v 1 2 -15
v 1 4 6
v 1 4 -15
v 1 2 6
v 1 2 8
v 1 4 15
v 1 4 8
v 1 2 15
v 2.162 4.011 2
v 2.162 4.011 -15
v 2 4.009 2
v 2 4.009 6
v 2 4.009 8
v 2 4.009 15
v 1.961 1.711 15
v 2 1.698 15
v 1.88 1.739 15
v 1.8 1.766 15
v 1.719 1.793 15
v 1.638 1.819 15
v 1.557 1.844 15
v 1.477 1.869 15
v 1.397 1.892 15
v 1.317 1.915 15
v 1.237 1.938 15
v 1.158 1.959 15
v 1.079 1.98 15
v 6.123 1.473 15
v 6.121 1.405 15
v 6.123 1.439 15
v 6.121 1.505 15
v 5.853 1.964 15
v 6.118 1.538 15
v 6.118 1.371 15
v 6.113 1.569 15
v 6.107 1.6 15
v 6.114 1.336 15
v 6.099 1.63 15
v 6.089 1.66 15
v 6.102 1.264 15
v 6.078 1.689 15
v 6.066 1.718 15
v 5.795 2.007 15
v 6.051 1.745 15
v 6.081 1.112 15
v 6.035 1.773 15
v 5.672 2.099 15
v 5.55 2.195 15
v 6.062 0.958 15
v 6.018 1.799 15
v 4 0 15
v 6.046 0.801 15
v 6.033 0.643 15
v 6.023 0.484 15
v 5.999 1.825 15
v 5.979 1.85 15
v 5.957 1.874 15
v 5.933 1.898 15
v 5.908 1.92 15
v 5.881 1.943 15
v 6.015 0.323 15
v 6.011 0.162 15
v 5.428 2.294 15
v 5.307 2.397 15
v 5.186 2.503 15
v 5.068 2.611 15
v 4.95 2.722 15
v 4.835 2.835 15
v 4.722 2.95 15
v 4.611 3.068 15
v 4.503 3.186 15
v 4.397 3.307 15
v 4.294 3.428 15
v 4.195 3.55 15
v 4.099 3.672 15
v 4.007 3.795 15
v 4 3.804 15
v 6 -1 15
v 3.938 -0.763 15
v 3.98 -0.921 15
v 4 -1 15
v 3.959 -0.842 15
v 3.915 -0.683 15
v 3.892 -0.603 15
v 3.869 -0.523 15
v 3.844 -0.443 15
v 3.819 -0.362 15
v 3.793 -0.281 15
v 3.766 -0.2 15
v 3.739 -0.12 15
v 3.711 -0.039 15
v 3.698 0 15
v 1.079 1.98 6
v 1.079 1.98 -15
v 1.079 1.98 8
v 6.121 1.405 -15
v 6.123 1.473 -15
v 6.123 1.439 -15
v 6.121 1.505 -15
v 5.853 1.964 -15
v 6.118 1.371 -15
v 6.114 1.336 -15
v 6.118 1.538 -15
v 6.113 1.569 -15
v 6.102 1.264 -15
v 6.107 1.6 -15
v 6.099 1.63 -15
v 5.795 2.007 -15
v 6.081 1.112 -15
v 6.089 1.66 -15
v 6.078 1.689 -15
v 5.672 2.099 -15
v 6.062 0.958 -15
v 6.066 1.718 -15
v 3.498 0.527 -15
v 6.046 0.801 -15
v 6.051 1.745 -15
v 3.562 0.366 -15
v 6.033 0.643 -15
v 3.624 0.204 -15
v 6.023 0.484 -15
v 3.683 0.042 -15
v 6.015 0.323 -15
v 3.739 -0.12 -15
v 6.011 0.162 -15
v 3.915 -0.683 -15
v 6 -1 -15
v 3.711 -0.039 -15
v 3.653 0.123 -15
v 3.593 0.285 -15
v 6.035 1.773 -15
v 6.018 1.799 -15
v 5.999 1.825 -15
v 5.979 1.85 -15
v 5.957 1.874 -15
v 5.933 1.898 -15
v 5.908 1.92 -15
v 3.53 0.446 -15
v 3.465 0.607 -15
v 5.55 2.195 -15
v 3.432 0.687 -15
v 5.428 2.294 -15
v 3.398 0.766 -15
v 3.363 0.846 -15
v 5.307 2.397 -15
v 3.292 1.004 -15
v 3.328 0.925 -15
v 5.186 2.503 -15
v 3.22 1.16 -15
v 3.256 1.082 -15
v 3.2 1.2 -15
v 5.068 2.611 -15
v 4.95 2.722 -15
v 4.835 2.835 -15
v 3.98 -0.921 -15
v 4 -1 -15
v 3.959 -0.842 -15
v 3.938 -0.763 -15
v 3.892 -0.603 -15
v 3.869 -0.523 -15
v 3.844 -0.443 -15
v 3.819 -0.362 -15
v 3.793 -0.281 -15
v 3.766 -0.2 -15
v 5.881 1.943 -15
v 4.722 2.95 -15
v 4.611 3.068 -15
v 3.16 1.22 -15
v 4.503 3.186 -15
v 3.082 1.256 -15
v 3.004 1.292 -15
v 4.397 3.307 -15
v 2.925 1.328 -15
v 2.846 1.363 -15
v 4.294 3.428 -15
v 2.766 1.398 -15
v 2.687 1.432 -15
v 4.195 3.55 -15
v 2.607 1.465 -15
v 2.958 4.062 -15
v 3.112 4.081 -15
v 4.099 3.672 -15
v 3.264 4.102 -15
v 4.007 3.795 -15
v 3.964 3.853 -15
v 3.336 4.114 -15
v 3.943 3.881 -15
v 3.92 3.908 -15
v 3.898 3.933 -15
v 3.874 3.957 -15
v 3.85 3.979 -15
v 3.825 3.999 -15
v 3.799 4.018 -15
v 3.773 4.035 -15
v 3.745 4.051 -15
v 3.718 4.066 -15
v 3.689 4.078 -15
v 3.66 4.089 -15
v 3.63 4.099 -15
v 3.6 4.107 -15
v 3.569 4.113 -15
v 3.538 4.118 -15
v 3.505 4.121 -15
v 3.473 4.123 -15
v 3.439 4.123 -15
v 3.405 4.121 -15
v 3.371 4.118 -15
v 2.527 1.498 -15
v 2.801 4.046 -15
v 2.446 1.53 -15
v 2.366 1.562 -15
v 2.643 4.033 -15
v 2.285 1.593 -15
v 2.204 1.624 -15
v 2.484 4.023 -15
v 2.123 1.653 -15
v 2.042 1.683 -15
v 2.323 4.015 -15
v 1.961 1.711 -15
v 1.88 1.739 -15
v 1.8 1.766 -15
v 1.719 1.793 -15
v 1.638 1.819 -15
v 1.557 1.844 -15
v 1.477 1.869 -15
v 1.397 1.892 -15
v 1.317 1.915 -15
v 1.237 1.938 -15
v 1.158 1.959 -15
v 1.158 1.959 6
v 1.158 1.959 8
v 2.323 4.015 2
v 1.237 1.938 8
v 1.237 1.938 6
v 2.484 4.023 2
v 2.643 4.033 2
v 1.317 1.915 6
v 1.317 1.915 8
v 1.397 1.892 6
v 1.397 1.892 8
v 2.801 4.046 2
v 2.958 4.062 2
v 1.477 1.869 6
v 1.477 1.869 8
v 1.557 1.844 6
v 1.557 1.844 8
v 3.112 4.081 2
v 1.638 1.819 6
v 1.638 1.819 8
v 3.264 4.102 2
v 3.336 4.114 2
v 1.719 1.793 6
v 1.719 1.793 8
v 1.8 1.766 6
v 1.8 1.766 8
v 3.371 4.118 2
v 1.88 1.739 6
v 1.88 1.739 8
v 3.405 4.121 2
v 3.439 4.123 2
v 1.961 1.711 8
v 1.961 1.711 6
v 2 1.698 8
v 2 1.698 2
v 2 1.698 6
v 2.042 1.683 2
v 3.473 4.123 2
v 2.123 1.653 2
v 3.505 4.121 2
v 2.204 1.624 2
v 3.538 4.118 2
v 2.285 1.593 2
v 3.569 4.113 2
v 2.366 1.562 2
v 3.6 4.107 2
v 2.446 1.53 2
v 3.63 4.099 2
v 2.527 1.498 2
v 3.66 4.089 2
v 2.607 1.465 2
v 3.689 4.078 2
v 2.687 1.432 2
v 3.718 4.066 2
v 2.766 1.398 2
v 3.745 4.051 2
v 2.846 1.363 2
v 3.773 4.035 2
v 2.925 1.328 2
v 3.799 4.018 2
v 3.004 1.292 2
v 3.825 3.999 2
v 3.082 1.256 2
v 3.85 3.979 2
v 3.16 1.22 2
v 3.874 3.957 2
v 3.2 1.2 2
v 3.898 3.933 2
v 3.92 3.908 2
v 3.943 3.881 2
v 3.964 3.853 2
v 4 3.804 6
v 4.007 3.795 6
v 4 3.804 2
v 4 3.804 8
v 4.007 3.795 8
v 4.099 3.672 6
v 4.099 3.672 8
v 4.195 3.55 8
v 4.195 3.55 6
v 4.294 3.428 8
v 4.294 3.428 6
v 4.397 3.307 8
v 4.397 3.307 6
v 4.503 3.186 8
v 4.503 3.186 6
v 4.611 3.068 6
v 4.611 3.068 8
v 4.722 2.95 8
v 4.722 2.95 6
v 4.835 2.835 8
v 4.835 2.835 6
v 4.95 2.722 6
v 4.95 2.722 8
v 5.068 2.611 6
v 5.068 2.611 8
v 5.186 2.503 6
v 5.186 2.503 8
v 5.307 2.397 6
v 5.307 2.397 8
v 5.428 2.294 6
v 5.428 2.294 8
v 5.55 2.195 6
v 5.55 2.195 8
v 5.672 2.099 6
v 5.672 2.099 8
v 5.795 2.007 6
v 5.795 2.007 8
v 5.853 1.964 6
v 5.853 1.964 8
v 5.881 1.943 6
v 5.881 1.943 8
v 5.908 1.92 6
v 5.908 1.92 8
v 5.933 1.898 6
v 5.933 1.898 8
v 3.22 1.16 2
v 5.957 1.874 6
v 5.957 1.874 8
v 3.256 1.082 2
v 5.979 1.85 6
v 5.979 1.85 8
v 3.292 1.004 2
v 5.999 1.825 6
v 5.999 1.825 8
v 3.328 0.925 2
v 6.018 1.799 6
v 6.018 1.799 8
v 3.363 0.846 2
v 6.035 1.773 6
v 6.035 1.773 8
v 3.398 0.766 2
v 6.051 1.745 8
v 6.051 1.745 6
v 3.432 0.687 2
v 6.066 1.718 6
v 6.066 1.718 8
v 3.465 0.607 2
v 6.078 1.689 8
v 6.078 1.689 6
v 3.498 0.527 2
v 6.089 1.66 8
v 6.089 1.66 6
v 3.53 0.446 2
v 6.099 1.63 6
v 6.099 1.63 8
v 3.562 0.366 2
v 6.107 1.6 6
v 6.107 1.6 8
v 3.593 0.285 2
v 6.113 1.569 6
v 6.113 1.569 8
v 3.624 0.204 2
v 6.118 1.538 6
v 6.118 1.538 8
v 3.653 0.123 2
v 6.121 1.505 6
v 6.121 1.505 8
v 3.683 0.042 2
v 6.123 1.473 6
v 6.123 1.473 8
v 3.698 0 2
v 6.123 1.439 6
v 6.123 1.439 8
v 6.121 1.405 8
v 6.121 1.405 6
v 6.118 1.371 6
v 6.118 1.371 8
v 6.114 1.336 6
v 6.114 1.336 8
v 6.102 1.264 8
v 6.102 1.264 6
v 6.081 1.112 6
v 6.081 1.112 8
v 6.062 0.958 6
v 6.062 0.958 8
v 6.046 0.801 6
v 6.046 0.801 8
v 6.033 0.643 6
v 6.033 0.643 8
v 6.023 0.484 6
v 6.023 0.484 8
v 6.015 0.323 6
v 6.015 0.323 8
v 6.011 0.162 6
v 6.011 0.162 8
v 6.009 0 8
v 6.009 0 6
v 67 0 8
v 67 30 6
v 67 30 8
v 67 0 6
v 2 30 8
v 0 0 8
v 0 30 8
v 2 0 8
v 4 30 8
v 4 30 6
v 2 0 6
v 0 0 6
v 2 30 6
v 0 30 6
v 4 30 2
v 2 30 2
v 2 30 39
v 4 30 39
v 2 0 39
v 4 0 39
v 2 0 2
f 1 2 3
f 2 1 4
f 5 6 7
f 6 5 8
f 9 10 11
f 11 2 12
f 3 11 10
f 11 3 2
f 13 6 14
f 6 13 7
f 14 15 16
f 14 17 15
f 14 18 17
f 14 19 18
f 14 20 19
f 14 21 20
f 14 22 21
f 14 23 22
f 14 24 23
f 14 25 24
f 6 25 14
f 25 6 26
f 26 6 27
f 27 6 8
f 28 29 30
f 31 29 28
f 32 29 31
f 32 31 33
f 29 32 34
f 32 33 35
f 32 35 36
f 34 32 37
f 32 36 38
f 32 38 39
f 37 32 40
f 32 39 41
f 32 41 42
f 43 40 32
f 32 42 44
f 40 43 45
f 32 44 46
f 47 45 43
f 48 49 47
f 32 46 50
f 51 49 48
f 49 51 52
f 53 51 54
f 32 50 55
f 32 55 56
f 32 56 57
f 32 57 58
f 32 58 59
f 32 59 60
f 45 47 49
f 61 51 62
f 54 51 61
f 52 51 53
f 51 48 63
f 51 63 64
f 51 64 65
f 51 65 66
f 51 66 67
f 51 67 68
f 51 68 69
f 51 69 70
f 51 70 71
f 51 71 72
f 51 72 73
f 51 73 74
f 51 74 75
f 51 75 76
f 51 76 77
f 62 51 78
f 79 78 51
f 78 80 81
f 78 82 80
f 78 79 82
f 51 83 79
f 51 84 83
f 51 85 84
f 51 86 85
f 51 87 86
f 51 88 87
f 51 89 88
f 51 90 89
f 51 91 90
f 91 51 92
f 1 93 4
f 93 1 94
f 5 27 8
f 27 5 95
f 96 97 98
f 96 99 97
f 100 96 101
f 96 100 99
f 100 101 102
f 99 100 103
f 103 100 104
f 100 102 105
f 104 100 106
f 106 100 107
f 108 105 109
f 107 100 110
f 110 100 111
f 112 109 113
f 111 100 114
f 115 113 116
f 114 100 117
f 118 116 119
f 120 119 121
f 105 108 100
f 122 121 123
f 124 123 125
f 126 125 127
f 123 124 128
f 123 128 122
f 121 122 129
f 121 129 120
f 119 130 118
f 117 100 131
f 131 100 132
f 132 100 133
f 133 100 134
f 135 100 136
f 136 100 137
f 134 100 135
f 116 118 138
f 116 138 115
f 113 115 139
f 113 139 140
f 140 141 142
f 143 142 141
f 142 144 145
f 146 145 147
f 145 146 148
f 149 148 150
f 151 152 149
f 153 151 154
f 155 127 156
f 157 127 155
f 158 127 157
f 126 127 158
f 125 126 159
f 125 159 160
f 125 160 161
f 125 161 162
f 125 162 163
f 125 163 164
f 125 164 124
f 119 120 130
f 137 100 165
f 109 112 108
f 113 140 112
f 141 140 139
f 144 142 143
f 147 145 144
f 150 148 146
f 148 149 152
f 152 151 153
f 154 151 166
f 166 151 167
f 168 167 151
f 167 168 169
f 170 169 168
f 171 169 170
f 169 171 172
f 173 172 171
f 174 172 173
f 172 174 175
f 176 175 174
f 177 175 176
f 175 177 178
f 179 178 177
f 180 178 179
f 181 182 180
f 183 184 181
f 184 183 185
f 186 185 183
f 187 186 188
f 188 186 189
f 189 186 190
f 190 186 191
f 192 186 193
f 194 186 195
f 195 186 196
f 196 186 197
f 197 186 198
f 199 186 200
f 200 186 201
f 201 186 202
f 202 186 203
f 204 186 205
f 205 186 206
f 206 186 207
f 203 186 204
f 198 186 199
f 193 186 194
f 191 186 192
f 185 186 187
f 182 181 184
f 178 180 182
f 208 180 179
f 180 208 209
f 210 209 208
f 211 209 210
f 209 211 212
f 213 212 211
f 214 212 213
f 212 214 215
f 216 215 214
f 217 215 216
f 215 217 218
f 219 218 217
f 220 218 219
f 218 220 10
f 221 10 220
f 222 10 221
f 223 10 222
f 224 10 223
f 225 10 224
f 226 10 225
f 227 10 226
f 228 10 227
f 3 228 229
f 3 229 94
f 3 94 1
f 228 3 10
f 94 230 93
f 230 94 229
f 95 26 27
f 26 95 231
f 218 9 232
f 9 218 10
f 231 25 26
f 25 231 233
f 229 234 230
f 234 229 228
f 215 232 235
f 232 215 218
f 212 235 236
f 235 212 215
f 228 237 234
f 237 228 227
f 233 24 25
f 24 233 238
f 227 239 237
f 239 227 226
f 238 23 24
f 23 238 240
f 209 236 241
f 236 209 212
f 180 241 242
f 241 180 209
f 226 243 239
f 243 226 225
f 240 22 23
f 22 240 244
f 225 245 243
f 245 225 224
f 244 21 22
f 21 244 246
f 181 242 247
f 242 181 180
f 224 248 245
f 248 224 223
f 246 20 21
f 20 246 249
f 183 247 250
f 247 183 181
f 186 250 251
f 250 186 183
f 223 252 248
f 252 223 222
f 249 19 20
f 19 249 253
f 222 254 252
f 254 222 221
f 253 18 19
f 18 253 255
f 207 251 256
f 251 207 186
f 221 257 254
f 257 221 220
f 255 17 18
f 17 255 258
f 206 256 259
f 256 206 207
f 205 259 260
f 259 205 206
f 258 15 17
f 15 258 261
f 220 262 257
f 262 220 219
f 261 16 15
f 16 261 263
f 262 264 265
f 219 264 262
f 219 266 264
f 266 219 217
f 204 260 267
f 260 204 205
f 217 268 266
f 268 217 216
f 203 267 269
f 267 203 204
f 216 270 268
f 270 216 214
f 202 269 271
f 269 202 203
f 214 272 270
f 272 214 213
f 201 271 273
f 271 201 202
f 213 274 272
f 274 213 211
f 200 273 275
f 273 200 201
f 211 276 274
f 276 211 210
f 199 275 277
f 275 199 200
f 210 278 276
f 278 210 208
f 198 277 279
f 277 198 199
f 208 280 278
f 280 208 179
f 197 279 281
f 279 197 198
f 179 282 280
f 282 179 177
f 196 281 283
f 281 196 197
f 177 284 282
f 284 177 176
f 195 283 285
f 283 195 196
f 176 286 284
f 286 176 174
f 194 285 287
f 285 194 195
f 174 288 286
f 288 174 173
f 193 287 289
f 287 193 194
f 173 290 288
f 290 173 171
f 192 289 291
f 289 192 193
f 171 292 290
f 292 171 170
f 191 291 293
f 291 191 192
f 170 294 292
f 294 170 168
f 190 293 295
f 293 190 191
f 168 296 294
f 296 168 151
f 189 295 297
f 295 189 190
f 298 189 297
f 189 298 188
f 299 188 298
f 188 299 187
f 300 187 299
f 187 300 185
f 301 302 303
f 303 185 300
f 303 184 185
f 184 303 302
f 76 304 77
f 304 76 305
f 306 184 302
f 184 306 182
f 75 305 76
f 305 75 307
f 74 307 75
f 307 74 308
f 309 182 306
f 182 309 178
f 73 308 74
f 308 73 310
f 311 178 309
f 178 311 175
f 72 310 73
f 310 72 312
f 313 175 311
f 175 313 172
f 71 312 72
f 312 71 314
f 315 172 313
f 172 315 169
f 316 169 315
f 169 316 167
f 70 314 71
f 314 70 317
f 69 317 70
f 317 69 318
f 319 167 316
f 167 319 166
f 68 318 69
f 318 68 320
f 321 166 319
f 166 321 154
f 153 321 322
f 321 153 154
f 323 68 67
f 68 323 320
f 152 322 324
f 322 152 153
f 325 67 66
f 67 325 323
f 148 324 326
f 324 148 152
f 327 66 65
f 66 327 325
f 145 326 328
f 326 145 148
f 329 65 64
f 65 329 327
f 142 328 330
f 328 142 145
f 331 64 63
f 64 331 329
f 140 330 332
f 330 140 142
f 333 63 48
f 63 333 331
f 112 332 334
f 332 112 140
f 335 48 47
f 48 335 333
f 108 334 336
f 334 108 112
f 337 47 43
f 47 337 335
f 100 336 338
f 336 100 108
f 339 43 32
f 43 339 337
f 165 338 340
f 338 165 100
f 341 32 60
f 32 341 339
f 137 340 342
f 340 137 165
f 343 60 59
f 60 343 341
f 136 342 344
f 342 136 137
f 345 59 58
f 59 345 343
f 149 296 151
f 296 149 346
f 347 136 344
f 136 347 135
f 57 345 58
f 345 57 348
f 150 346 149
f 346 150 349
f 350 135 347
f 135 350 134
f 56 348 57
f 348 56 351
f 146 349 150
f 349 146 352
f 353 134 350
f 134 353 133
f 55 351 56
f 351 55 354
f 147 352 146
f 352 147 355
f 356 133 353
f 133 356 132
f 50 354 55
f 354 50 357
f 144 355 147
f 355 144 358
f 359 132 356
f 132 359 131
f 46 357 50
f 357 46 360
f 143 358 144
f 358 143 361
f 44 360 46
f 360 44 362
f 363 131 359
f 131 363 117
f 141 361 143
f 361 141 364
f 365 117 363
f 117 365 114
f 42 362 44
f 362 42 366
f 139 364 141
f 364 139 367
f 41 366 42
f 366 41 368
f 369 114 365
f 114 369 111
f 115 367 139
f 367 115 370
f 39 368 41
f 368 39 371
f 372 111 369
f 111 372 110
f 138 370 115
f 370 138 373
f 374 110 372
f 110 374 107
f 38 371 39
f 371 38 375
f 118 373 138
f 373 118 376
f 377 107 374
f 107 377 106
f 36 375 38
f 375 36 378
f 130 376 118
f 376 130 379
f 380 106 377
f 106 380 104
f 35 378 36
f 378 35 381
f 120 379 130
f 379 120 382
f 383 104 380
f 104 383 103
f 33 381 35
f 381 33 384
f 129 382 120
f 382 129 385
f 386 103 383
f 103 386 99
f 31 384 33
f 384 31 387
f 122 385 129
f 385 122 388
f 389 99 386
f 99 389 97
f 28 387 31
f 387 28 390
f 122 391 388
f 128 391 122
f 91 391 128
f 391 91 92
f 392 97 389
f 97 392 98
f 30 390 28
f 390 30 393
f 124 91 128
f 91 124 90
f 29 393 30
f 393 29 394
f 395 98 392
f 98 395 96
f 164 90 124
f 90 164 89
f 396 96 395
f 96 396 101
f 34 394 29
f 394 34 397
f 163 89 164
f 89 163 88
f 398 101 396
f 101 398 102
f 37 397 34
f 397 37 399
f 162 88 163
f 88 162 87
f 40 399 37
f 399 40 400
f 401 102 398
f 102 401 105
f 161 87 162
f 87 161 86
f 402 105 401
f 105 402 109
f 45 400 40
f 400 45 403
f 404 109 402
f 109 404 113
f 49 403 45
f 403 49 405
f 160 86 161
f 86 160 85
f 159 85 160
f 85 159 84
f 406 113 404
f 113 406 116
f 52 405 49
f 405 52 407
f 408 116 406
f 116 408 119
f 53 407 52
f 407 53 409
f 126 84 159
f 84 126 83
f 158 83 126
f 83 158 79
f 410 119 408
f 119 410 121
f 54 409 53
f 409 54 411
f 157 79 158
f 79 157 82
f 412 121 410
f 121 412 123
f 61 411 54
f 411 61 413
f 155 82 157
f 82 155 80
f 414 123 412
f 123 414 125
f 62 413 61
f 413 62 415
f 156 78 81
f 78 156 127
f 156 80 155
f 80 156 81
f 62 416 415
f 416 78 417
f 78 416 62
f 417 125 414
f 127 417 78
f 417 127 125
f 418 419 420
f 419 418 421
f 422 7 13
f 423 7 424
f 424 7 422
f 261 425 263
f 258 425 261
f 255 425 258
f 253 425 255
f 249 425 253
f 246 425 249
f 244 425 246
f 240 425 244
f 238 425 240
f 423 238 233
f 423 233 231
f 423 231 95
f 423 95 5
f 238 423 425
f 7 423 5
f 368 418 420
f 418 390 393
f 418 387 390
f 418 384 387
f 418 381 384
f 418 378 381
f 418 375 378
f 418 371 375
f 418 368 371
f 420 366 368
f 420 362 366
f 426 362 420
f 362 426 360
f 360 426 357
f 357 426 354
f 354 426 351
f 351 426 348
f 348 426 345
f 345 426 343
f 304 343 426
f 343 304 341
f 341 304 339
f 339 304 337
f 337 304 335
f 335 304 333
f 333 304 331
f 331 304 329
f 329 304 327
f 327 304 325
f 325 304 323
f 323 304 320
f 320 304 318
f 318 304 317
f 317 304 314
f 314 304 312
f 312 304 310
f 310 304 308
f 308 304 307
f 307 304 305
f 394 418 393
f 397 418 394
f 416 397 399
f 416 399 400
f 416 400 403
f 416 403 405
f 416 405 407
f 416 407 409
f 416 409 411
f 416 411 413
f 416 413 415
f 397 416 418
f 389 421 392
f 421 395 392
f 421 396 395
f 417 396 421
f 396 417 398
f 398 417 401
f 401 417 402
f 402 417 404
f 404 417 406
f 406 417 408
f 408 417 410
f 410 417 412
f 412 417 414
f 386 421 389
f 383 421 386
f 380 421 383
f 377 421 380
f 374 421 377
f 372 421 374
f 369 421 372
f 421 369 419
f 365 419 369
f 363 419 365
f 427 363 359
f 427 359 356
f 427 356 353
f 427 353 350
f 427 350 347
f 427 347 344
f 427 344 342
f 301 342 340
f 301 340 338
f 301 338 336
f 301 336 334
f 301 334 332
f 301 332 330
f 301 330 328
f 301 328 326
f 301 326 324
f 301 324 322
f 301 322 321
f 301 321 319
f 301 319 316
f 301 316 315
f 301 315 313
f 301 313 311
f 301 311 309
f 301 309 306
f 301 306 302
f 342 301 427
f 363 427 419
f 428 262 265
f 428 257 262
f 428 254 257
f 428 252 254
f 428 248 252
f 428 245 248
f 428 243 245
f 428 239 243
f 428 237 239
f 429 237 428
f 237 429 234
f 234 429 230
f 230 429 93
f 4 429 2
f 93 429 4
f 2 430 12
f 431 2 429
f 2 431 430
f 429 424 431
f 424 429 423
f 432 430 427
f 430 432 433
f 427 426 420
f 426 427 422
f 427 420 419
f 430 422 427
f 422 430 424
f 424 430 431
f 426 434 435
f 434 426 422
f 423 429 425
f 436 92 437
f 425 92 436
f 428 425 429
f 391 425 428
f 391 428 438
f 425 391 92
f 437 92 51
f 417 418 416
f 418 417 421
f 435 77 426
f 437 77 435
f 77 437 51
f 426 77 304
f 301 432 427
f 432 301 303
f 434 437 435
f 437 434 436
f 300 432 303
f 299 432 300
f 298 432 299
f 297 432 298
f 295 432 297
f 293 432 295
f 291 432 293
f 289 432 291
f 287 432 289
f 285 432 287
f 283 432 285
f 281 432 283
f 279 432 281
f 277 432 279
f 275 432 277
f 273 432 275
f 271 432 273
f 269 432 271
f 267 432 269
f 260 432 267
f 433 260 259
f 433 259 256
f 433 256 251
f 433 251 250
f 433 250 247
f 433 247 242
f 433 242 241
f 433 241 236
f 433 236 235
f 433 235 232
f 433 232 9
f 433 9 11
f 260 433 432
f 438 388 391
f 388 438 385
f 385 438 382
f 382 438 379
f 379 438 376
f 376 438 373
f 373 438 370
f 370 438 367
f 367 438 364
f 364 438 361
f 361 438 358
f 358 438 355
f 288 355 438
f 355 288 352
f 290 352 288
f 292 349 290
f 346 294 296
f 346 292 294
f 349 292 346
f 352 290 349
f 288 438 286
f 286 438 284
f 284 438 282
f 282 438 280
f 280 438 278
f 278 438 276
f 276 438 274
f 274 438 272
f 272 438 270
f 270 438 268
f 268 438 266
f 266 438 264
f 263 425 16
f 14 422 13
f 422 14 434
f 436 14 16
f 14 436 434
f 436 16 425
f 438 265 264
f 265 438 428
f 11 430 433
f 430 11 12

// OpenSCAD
$fn = 256;

thickness_mm = 2.0;
width_mm = 30.0;
flange_a_mm = 70.0;
flange_b_mm = 40.0;
inside_radius_mm = 2.0;
k_factor = 0.45;
bend_angle_deg = 90.0;

neutral_radius_mm = inside_radius_mm + k_factor * thickness_mm;
angle_rad = bend_angle_deg * PI / 180.0;
bend_allowance_mm = angle_rad * neutral_radius_mm;
developed_flat_length_mm = (flange_a_mm - thickness_mm - k_factor * thickness_mm) +
                          (flange_b_mm - thickness_mm - k_factor * thickness_mm) +
                          bend_allowance_mm;

echo(str("MAKERBENCH-SHEETMETAL: {",
         "\"thickness_mm\": ", thickness_mm, ", ",
         "\"bend_radius_mm\": ", inside_radius_mm, ", ",
         "\"developed_flat_length_mm\": ", developed_flat_length_mm,
         "}"));

module bend_slice(a_deg) {
    r = inside_radius_mm + thickness_mm / 2.0;
    cx = r * cos(a_deg);
    cz = r * sin(a_deg);

    // Cross-section is width x thickness in the width/normal directions.
    // Axis of the bend is +Y, sweep happens in X-Z.
    rotate([90, 0, 0])           // turn Y into the extrusion axis of rotate_extrude later
        translate([cx, 0, cz])
        rotate([0, a_deg, 0])
        cube([thickness_mm, width_mm, thickness_mm], center = true);
}

module bend_shell(steps = 80) {
    for (i = [0 : steps - 1]) {
        a0 = (90.0 * i) / steps;
        a1 = (90.0 * (i + 1)) / steps;
        hull() {
            bend_slice(a0);
            bend_slice(a1);
        }
    }
}

module bracket() {
    // Straight legs are attached to the sweep tangents of the bend.
    leg_a = flange_a_mm - (inside_radius_mm + thickness_mm / 2.0);
    leg_b = flange_b_mm - (inside_radius_mm + thickness_mm / 2.0);
    a_center = inside_radius_mm + thickness_mm / 2.0;
    z0 = a_center;

    // Leg A (along +X direction in this model)
    translate([0, 0, z0 + a_center])
        cube([leg_a, width_mm, thickness_mm], center = false);

    // Leg B (along +Y direction in this model)
    translate([a_center - thickness_mm / 2.0, 0, a_center - thickness_mm / 2.0])
        cube([thickness_mm, width_mm, leg_b], center = false);

    // 90-degree bend with constant gauge and inside radius
    translate([a_center - thickness_mm / 2.0, 0, 0])
        rotate([0, 0, 90])
        bend_shell();
}

bracket();
